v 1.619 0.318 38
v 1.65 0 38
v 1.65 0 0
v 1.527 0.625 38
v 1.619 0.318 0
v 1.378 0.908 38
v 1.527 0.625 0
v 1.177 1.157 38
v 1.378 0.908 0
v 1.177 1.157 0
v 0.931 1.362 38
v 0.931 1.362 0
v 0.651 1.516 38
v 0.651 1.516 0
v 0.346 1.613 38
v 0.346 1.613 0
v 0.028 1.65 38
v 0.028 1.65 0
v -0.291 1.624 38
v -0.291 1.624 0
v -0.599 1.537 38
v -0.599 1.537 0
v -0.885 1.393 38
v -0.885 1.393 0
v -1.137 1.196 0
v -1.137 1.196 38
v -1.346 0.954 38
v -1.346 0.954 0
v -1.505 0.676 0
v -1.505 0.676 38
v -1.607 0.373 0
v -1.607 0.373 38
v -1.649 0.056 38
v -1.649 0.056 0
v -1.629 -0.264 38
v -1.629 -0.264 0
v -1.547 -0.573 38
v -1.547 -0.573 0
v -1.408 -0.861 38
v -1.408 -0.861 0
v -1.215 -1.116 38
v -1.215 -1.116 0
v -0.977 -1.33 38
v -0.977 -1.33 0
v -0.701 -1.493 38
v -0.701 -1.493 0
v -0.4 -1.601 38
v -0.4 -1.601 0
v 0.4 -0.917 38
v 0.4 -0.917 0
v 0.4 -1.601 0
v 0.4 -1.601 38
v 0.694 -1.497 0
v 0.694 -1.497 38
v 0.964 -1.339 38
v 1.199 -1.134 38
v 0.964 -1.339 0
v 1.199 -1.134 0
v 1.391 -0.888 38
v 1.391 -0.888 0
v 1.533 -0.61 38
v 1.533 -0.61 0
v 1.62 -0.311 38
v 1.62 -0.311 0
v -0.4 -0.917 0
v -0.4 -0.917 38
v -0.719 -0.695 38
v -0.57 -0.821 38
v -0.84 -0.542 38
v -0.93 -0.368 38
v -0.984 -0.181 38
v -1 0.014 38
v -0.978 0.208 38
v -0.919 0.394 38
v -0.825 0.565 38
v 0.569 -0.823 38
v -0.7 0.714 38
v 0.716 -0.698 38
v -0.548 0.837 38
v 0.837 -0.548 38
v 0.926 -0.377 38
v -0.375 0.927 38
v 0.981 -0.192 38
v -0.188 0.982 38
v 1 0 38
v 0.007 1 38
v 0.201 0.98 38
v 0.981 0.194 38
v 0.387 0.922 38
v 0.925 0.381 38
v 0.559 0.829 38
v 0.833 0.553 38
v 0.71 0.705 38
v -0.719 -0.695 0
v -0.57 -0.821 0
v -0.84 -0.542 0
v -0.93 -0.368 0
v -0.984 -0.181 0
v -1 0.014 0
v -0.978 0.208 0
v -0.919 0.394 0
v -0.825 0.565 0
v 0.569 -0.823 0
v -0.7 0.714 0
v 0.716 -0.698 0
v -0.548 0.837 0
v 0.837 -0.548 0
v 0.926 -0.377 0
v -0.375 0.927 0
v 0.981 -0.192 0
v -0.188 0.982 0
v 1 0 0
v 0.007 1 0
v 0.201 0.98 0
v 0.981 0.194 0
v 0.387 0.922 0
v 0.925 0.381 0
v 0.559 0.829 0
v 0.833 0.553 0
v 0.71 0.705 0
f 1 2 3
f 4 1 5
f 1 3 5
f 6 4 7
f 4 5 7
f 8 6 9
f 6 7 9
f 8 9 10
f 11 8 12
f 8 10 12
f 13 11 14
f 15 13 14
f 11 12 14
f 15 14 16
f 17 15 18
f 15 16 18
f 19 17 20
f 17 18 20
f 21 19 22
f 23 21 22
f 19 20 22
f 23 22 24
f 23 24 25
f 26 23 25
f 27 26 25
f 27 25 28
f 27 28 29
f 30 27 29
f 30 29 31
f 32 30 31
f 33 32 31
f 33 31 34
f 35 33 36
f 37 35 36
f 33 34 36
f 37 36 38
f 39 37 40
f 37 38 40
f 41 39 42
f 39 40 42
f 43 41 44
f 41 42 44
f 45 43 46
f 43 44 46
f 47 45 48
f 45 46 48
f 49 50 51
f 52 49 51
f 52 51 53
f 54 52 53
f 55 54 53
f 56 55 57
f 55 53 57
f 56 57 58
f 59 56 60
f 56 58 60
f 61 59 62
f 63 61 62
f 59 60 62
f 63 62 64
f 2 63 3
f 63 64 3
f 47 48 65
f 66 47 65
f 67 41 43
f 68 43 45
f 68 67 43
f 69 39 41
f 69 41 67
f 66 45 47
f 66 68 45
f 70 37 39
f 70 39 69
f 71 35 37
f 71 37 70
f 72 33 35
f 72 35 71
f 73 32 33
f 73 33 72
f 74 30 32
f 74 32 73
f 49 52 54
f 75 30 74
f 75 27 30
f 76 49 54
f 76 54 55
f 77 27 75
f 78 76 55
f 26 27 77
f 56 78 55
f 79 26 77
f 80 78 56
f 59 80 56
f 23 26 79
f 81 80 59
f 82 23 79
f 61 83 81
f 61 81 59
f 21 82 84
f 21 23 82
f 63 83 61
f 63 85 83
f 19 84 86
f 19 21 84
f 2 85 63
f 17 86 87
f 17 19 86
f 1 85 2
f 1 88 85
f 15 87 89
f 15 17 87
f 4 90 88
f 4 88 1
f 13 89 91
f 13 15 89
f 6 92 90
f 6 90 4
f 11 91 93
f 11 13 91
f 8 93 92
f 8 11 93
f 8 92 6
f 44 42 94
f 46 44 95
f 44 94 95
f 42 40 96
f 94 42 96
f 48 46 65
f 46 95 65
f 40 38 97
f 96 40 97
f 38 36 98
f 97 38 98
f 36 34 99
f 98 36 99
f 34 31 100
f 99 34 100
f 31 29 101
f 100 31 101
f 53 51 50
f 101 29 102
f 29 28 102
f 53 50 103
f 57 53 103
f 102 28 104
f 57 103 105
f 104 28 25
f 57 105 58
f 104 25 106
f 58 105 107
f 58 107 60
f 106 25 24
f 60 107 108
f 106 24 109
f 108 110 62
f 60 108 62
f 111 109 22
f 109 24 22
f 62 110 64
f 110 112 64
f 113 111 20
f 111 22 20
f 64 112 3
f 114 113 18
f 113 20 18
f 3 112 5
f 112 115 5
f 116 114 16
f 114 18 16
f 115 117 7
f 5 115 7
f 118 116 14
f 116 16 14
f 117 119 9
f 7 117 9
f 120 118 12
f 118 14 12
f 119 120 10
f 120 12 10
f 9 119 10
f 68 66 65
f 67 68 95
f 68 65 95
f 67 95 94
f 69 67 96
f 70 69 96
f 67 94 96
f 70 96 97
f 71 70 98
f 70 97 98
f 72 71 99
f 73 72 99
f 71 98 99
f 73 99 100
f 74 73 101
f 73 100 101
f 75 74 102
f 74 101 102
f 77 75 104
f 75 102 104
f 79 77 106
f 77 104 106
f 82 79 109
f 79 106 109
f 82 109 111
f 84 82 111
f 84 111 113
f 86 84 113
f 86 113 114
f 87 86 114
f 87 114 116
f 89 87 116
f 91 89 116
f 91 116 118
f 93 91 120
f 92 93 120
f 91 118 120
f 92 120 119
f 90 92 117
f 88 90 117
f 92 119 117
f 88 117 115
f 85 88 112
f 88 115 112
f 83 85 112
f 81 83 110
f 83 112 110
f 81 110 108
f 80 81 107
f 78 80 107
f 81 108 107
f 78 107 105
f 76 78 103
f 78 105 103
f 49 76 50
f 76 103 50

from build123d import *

# Parameters (mm, degrees)
DOWEL_BODY_DEPTH = 38


with BuildPart() as part:
    # Sketch1 → dowel_body (new body)
    with BuildSketch(Plane.XY):
        with BuildLine():
            Line((-0.4, -1.600781059), (-0.4, -0.916515139))
            ThreePointArc((-0.4, -0.916515139), (-0.547722558, 0.836660027), (1, 0))
            ThreePointArc((1, 0), (0.836660027, -0.547722558), (0.4, -0.916515139))
            Line((0.4, -0.916515139), (0.4, -1.600781059))
            ThreePointArc((0.4, -1.600781059), (1.30048068, -1.015504801), (1.65, 0))
            ThreePointArc((1.65, 0), (-1.015504801, 1.30048068), (-0.4, -1.600781059))
        make_face()
    extrude(amount=DOWEL_BODY_DEPTH)


solid = part.part
